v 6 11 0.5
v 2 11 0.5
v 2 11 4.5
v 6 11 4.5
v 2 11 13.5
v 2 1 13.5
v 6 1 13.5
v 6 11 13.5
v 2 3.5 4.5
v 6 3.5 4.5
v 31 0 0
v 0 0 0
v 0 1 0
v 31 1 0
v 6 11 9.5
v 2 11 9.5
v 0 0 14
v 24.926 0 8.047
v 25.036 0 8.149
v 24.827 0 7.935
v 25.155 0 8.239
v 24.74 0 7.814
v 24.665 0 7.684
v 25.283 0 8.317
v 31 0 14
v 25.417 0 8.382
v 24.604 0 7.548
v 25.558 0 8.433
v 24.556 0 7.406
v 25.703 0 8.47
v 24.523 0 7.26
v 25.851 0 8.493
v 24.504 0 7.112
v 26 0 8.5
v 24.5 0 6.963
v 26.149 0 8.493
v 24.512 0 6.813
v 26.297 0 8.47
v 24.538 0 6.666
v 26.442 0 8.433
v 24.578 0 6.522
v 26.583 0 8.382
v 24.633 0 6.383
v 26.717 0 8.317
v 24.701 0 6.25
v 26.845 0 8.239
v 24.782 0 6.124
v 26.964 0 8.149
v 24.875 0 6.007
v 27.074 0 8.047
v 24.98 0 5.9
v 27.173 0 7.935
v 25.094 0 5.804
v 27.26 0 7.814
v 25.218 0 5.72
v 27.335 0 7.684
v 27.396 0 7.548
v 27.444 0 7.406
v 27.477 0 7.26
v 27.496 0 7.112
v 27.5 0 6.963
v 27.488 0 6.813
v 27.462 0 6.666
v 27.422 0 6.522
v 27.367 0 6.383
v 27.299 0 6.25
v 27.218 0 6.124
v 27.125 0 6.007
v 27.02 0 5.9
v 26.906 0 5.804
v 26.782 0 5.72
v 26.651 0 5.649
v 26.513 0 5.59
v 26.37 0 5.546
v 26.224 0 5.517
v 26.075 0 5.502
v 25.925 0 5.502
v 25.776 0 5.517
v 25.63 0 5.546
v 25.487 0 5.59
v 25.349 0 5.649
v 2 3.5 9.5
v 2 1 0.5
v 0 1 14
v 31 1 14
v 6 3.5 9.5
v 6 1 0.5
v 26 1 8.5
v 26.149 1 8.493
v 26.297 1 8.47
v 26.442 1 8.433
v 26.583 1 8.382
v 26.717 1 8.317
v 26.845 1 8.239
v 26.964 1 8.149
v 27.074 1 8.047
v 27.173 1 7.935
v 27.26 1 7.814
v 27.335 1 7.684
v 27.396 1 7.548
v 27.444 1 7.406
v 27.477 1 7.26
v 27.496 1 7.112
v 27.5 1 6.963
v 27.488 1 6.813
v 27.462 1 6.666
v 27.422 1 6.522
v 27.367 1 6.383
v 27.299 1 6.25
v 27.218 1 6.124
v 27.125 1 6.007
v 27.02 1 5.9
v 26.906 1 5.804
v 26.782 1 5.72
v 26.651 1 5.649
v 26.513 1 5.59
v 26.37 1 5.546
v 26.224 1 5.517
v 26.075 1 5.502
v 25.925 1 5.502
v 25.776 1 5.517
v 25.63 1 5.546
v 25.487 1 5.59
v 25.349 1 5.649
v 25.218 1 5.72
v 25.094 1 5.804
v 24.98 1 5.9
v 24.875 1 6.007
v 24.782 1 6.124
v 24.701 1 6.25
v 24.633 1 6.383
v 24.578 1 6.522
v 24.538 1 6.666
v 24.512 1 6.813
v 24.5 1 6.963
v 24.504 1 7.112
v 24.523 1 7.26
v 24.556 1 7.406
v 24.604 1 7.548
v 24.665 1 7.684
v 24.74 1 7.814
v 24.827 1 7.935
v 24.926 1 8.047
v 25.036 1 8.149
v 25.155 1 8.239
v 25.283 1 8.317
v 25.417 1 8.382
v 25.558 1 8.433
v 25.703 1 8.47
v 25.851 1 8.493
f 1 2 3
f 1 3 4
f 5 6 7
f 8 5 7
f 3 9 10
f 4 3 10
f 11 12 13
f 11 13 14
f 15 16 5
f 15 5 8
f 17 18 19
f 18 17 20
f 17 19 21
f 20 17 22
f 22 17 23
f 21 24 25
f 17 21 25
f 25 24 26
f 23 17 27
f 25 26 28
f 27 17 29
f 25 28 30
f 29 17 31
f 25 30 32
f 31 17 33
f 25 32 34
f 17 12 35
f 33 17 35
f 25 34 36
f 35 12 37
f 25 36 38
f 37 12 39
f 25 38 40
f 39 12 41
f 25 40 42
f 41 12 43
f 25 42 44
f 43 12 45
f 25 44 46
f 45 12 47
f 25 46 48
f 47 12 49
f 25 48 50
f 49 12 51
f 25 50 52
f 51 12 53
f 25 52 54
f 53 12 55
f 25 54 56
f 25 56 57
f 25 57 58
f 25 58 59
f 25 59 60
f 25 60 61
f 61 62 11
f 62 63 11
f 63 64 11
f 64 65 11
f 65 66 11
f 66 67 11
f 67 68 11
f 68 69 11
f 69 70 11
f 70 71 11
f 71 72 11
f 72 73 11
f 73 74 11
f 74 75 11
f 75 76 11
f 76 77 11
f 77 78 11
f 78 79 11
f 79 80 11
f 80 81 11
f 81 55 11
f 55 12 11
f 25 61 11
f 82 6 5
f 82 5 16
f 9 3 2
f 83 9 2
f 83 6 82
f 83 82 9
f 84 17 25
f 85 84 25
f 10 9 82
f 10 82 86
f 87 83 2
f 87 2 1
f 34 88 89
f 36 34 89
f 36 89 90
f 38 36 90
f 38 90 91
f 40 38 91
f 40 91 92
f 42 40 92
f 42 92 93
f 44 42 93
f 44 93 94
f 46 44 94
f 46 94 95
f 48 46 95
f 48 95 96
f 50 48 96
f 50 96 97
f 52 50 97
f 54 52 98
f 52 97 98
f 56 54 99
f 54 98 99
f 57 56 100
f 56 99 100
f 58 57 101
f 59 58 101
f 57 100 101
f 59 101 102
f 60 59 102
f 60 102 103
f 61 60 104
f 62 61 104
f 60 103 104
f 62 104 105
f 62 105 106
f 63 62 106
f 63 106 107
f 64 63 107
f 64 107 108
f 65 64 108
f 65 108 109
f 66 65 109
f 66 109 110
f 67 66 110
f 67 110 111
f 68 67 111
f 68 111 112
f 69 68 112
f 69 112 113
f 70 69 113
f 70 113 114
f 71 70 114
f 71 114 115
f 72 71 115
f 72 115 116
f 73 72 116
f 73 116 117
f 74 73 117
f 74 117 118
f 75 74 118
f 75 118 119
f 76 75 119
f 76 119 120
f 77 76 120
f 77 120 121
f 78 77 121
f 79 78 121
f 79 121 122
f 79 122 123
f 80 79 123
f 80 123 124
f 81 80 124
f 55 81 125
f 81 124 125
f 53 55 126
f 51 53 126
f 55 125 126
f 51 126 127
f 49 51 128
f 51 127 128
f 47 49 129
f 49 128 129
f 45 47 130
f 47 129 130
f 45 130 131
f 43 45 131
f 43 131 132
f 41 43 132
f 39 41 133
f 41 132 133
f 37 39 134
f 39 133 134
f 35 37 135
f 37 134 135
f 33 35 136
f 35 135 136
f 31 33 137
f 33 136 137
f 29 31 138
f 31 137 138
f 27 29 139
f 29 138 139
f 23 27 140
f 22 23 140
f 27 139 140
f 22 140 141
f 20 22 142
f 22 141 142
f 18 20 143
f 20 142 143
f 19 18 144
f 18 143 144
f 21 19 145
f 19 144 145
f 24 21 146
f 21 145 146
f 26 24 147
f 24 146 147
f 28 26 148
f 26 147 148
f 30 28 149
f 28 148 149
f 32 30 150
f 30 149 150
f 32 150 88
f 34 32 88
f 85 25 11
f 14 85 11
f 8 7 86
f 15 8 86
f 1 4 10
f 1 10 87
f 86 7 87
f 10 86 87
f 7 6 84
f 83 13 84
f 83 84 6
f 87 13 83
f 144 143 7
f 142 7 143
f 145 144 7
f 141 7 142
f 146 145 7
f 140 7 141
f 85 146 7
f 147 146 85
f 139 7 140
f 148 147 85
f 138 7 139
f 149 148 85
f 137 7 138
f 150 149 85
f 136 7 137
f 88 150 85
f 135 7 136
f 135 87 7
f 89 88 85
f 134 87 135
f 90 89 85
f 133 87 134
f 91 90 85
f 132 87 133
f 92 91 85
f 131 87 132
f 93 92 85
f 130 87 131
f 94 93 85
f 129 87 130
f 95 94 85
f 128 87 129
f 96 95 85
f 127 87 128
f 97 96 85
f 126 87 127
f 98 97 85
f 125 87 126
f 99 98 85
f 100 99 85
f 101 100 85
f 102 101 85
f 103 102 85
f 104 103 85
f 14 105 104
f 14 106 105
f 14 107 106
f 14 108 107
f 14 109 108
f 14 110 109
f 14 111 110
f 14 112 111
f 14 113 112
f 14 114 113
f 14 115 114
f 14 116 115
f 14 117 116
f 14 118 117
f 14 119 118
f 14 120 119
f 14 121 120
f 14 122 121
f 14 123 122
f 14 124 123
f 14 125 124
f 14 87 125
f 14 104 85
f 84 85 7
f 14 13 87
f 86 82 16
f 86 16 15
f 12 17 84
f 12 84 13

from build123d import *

# Parameters (mm, degrees)
SKETCH1_W           = 31
SKETCH1_H           = 14
BOSS_EXTRUDE1_DEPTH = 1
SKETCH2_W           = 4
SKETCH2_H           = 4
BOSS_EXTRUDE2_DEPTH = 10
SKETCH3_R           = 1.5
CUT_EXTRUDE1_DEPTH  = 36.454195802
SKETCH4_W           = 4
SKETCH4_H           = 5
BOSS_EXTRUDE3_DEPTH = 2.5


with BuildPart() as part:
    # Sketch1 → Boss-Extrude1 (new body)
    with BuildSketch(Plane(origin=(0, 0, 0), x_dir=(1, 0, 0), z_dir=(0, 1, 0))):
        with Locations((15.5, -7)):
            Rectangle(SKETCH1_W, SKETCH1_H)
    extrude(amount=BOSS_EXTRUDE1_DEPTH)

    # Sketch2 → Boss-Extrude2 (add)
    with BuildSketch(Plane(origin=(0, 1, 0), x_dir=(1, 0, 0), z_dir=(0, 1, 0))):
        with Locations((4, -11.5)):
            Rectangle(SKETCH2_W, SKETCH2_H)
        with Locations((4, -2.5)):
            Rectangle(SKETCH2_W, SKETCH2_H)
    extrude(amount=BOSS_EXTRUDE2_DEPTH)

    # Sketch3 → Cut-Extrude1 (cut, through all)
    with BuildSketch(Plane(origin=(0, 1, 0), x_dir=(1, 0, 0), z_dir=(0, 1, 0))):
        with Locations(Location((26, -7, 0), (0, 0, 270))):
            Circle(SKETCH3_R)
    extrude(amount=-CUT_EXTRUDE1_DEPTH, mode=Mode.SUBTRACT)

    # Sketch4 → Boss-Extrude3 (add)
    with BuildSketch(Plane(origin=(0, 1, 0), x_dir=(1, 0, 0), z_dir=(0, 1, 0))):
        with Locations((4, -7)):
            Rectangle(SKETCH4_W, SKETCH4_H)
    extrude(amount=BOSS_EXTRUDE3_DEPTH)


solid = part.part
